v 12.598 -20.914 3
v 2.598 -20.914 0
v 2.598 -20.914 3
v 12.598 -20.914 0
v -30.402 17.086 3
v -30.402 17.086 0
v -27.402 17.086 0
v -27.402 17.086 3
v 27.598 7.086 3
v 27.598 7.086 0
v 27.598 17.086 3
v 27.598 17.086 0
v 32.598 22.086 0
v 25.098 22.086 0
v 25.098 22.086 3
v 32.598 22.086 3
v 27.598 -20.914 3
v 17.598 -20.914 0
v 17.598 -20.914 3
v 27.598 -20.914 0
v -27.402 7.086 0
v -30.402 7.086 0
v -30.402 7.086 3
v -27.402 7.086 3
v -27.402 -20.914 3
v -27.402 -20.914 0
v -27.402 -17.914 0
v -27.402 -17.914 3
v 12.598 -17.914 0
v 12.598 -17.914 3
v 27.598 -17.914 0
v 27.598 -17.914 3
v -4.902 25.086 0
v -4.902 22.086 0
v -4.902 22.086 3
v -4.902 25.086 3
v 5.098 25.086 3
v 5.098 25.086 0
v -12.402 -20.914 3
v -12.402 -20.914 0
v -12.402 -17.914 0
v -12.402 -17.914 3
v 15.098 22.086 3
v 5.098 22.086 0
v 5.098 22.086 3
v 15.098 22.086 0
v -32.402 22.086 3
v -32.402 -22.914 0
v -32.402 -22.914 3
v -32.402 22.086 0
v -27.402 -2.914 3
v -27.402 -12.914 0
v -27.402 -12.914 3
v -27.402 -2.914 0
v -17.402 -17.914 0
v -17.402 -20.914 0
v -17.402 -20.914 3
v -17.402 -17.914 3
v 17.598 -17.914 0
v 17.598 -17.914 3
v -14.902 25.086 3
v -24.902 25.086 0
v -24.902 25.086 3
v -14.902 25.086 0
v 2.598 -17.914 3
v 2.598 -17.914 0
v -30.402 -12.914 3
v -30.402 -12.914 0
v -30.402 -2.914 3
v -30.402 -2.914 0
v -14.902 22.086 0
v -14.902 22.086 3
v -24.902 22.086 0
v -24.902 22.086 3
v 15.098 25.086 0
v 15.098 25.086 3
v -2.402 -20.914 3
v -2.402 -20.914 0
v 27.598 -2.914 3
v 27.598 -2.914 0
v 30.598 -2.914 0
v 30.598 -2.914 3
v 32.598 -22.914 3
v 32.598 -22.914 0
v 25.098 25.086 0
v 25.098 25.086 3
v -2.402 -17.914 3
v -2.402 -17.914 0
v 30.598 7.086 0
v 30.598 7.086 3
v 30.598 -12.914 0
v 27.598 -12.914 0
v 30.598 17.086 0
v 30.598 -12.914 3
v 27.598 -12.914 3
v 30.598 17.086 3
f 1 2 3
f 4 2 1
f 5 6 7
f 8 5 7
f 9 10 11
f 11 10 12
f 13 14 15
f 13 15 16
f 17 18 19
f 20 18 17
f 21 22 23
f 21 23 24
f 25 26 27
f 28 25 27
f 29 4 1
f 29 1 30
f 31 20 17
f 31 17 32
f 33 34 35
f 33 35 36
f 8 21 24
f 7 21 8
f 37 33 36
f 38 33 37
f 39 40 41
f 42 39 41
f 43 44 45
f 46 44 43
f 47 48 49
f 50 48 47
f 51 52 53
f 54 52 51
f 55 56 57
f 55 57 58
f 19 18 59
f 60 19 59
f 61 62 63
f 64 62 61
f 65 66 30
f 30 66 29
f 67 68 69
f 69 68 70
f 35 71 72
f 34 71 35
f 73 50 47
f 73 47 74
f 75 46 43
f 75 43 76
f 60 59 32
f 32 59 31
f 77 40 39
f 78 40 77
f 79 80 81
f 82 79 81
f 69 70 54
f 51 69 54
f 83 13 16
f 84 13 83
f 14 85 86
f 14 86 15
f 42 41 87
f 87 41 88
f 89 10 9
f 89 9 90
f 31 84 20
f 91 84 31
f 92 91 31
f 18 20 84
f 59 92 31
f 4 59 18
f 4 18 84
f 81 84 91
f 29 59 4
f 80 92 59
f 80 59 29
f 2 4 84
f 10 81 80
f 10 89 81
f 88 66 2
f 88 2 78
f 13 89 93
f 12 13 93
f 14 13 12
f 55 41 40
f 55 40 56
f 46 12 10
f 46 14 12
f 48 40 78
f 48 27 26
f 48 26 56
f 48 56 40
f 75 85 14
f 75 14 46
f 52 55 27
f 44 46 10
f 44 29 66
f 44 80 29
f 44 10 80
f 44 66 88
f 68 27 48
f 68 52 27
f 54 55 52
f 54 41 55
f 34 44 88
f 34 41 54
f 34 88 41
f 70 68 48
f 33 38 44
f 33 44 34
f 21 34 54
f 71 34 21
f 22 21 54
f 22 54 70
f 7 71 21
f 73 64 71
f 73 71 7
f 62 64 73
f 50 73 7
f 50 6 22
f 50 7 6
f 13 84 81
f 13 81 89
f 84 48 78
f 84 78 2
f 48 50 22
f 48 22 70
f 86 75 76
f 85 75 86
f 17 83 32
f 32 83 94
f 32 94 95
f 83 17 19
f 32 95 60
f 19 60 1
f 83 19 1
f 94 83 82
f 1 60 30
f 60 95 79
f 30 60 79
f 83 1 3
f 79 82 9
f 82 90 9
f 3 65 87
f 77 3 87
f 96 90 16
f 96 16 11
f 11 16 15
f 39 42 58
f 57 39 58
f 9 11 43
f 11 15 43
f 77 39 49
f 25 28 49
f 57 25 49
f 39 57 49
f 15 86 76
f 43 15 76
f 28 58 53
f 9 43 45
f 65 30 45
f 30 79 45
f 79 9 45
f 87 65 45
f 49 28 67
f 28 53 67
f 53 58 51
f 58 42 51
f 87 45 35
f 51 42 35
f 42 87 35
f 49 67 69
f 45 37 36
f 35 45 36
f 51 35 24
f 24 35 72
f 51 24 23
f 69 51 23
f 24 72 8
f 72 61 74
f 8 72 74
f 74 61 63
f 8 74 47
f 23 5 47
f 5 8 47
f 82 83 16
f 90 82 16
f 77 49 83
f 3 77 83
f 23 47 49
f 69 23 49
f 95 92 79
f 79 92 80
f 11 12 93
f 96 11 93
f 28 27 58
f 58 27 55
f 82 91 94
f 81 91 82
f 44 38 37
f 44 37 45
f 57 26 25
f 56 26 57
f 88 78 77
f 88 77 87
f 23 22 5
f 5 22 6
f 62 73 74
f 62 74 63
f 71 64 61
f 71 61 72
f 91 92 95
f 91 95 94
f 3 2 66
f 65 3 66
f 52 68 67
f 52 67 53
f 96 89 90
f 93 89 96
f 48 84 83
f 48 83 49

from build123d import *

# Parameters (mm, degrees)
SKETCH_1_W      = 10
SKETCH_1_H      = 3
SKETCH_1_W_2    = 3
SKETCH_1_H_2    = 10
EXTRUDE_1_DEPTH = 3


with BuildPart() as part:
    # 草图1 → 凸台-拉伸1 (new body)
    with BuildSketch(Plane.XY):
        Polygon((-4.901841459, 22.085987353), (-4.901841459, 25.085987353), (5.098158541, 25.085987353), (5.098158541, 22.085987353), (15.098158541, 22.085987353), (15.098158541, 25.085987353), (25.098158541, 25.085987353), (25.098158541, 22.085987353), (32.598158541, 22.085987353), (32.598158541, -22.914012647), (-32.401841459, -22.914012647), (-32.401841459, 22.085987353), (-24.901841459, 22.085987353), (-24.901841459, 25.085987353), (-14.901841459, 25.085987353), (-14.901841459, 22.085987353), align=None)
        with Locations((-7.401841459, -19.414012647)):
            Rectangle(SKETCH_1_W, SKETCH_1_H, mode=Mode.SUBTRACT)
        with Locations((-22.401841459, -19.414012647)):
            Rectangle(SKETCH_1_W, SKETCH_1_H, mode=Mode.SUBTRACT)
        with Locations((7.598158541, -19.414012647)):
            Rectangle(SKETCH_1_W, SKETCH_1_H, mode=Mode.SUBTRACT)
        with Locations((22.598158541, -19.414012647)):
            Rectangle(SKETCH_1_W, SKETCH_1_H, mode=Mode.SUBTRACT)
        with Locations((-28.901841459, -7.914012647)):
            Rectangle(SKETCH_1_W_2, SKETCH_1_H_2, mode=Mode.SUBTRACT)
        with Locations((-28.901841459, 12.085987353)):
            Rectangle(SKETCH_1_W_2, SKETCH_1_H_2, mode=Mode.SUBTRACT)
        with Locations((29.098158541, -7.914012647)):
            Rectangle(SKETCH_1_W_2, SKETCH_1_H_2, mode=Mode.SUBTRACT)
        with Locations((29.098158541, 12.085987353)):
            Rectangle(SKETCH_1_W_2, SKETCH_1_H_2, mode=Mode.SUBTRACT)
    extrude(amount=EXTRUDE_1_DEPTH)


solid = part.part
